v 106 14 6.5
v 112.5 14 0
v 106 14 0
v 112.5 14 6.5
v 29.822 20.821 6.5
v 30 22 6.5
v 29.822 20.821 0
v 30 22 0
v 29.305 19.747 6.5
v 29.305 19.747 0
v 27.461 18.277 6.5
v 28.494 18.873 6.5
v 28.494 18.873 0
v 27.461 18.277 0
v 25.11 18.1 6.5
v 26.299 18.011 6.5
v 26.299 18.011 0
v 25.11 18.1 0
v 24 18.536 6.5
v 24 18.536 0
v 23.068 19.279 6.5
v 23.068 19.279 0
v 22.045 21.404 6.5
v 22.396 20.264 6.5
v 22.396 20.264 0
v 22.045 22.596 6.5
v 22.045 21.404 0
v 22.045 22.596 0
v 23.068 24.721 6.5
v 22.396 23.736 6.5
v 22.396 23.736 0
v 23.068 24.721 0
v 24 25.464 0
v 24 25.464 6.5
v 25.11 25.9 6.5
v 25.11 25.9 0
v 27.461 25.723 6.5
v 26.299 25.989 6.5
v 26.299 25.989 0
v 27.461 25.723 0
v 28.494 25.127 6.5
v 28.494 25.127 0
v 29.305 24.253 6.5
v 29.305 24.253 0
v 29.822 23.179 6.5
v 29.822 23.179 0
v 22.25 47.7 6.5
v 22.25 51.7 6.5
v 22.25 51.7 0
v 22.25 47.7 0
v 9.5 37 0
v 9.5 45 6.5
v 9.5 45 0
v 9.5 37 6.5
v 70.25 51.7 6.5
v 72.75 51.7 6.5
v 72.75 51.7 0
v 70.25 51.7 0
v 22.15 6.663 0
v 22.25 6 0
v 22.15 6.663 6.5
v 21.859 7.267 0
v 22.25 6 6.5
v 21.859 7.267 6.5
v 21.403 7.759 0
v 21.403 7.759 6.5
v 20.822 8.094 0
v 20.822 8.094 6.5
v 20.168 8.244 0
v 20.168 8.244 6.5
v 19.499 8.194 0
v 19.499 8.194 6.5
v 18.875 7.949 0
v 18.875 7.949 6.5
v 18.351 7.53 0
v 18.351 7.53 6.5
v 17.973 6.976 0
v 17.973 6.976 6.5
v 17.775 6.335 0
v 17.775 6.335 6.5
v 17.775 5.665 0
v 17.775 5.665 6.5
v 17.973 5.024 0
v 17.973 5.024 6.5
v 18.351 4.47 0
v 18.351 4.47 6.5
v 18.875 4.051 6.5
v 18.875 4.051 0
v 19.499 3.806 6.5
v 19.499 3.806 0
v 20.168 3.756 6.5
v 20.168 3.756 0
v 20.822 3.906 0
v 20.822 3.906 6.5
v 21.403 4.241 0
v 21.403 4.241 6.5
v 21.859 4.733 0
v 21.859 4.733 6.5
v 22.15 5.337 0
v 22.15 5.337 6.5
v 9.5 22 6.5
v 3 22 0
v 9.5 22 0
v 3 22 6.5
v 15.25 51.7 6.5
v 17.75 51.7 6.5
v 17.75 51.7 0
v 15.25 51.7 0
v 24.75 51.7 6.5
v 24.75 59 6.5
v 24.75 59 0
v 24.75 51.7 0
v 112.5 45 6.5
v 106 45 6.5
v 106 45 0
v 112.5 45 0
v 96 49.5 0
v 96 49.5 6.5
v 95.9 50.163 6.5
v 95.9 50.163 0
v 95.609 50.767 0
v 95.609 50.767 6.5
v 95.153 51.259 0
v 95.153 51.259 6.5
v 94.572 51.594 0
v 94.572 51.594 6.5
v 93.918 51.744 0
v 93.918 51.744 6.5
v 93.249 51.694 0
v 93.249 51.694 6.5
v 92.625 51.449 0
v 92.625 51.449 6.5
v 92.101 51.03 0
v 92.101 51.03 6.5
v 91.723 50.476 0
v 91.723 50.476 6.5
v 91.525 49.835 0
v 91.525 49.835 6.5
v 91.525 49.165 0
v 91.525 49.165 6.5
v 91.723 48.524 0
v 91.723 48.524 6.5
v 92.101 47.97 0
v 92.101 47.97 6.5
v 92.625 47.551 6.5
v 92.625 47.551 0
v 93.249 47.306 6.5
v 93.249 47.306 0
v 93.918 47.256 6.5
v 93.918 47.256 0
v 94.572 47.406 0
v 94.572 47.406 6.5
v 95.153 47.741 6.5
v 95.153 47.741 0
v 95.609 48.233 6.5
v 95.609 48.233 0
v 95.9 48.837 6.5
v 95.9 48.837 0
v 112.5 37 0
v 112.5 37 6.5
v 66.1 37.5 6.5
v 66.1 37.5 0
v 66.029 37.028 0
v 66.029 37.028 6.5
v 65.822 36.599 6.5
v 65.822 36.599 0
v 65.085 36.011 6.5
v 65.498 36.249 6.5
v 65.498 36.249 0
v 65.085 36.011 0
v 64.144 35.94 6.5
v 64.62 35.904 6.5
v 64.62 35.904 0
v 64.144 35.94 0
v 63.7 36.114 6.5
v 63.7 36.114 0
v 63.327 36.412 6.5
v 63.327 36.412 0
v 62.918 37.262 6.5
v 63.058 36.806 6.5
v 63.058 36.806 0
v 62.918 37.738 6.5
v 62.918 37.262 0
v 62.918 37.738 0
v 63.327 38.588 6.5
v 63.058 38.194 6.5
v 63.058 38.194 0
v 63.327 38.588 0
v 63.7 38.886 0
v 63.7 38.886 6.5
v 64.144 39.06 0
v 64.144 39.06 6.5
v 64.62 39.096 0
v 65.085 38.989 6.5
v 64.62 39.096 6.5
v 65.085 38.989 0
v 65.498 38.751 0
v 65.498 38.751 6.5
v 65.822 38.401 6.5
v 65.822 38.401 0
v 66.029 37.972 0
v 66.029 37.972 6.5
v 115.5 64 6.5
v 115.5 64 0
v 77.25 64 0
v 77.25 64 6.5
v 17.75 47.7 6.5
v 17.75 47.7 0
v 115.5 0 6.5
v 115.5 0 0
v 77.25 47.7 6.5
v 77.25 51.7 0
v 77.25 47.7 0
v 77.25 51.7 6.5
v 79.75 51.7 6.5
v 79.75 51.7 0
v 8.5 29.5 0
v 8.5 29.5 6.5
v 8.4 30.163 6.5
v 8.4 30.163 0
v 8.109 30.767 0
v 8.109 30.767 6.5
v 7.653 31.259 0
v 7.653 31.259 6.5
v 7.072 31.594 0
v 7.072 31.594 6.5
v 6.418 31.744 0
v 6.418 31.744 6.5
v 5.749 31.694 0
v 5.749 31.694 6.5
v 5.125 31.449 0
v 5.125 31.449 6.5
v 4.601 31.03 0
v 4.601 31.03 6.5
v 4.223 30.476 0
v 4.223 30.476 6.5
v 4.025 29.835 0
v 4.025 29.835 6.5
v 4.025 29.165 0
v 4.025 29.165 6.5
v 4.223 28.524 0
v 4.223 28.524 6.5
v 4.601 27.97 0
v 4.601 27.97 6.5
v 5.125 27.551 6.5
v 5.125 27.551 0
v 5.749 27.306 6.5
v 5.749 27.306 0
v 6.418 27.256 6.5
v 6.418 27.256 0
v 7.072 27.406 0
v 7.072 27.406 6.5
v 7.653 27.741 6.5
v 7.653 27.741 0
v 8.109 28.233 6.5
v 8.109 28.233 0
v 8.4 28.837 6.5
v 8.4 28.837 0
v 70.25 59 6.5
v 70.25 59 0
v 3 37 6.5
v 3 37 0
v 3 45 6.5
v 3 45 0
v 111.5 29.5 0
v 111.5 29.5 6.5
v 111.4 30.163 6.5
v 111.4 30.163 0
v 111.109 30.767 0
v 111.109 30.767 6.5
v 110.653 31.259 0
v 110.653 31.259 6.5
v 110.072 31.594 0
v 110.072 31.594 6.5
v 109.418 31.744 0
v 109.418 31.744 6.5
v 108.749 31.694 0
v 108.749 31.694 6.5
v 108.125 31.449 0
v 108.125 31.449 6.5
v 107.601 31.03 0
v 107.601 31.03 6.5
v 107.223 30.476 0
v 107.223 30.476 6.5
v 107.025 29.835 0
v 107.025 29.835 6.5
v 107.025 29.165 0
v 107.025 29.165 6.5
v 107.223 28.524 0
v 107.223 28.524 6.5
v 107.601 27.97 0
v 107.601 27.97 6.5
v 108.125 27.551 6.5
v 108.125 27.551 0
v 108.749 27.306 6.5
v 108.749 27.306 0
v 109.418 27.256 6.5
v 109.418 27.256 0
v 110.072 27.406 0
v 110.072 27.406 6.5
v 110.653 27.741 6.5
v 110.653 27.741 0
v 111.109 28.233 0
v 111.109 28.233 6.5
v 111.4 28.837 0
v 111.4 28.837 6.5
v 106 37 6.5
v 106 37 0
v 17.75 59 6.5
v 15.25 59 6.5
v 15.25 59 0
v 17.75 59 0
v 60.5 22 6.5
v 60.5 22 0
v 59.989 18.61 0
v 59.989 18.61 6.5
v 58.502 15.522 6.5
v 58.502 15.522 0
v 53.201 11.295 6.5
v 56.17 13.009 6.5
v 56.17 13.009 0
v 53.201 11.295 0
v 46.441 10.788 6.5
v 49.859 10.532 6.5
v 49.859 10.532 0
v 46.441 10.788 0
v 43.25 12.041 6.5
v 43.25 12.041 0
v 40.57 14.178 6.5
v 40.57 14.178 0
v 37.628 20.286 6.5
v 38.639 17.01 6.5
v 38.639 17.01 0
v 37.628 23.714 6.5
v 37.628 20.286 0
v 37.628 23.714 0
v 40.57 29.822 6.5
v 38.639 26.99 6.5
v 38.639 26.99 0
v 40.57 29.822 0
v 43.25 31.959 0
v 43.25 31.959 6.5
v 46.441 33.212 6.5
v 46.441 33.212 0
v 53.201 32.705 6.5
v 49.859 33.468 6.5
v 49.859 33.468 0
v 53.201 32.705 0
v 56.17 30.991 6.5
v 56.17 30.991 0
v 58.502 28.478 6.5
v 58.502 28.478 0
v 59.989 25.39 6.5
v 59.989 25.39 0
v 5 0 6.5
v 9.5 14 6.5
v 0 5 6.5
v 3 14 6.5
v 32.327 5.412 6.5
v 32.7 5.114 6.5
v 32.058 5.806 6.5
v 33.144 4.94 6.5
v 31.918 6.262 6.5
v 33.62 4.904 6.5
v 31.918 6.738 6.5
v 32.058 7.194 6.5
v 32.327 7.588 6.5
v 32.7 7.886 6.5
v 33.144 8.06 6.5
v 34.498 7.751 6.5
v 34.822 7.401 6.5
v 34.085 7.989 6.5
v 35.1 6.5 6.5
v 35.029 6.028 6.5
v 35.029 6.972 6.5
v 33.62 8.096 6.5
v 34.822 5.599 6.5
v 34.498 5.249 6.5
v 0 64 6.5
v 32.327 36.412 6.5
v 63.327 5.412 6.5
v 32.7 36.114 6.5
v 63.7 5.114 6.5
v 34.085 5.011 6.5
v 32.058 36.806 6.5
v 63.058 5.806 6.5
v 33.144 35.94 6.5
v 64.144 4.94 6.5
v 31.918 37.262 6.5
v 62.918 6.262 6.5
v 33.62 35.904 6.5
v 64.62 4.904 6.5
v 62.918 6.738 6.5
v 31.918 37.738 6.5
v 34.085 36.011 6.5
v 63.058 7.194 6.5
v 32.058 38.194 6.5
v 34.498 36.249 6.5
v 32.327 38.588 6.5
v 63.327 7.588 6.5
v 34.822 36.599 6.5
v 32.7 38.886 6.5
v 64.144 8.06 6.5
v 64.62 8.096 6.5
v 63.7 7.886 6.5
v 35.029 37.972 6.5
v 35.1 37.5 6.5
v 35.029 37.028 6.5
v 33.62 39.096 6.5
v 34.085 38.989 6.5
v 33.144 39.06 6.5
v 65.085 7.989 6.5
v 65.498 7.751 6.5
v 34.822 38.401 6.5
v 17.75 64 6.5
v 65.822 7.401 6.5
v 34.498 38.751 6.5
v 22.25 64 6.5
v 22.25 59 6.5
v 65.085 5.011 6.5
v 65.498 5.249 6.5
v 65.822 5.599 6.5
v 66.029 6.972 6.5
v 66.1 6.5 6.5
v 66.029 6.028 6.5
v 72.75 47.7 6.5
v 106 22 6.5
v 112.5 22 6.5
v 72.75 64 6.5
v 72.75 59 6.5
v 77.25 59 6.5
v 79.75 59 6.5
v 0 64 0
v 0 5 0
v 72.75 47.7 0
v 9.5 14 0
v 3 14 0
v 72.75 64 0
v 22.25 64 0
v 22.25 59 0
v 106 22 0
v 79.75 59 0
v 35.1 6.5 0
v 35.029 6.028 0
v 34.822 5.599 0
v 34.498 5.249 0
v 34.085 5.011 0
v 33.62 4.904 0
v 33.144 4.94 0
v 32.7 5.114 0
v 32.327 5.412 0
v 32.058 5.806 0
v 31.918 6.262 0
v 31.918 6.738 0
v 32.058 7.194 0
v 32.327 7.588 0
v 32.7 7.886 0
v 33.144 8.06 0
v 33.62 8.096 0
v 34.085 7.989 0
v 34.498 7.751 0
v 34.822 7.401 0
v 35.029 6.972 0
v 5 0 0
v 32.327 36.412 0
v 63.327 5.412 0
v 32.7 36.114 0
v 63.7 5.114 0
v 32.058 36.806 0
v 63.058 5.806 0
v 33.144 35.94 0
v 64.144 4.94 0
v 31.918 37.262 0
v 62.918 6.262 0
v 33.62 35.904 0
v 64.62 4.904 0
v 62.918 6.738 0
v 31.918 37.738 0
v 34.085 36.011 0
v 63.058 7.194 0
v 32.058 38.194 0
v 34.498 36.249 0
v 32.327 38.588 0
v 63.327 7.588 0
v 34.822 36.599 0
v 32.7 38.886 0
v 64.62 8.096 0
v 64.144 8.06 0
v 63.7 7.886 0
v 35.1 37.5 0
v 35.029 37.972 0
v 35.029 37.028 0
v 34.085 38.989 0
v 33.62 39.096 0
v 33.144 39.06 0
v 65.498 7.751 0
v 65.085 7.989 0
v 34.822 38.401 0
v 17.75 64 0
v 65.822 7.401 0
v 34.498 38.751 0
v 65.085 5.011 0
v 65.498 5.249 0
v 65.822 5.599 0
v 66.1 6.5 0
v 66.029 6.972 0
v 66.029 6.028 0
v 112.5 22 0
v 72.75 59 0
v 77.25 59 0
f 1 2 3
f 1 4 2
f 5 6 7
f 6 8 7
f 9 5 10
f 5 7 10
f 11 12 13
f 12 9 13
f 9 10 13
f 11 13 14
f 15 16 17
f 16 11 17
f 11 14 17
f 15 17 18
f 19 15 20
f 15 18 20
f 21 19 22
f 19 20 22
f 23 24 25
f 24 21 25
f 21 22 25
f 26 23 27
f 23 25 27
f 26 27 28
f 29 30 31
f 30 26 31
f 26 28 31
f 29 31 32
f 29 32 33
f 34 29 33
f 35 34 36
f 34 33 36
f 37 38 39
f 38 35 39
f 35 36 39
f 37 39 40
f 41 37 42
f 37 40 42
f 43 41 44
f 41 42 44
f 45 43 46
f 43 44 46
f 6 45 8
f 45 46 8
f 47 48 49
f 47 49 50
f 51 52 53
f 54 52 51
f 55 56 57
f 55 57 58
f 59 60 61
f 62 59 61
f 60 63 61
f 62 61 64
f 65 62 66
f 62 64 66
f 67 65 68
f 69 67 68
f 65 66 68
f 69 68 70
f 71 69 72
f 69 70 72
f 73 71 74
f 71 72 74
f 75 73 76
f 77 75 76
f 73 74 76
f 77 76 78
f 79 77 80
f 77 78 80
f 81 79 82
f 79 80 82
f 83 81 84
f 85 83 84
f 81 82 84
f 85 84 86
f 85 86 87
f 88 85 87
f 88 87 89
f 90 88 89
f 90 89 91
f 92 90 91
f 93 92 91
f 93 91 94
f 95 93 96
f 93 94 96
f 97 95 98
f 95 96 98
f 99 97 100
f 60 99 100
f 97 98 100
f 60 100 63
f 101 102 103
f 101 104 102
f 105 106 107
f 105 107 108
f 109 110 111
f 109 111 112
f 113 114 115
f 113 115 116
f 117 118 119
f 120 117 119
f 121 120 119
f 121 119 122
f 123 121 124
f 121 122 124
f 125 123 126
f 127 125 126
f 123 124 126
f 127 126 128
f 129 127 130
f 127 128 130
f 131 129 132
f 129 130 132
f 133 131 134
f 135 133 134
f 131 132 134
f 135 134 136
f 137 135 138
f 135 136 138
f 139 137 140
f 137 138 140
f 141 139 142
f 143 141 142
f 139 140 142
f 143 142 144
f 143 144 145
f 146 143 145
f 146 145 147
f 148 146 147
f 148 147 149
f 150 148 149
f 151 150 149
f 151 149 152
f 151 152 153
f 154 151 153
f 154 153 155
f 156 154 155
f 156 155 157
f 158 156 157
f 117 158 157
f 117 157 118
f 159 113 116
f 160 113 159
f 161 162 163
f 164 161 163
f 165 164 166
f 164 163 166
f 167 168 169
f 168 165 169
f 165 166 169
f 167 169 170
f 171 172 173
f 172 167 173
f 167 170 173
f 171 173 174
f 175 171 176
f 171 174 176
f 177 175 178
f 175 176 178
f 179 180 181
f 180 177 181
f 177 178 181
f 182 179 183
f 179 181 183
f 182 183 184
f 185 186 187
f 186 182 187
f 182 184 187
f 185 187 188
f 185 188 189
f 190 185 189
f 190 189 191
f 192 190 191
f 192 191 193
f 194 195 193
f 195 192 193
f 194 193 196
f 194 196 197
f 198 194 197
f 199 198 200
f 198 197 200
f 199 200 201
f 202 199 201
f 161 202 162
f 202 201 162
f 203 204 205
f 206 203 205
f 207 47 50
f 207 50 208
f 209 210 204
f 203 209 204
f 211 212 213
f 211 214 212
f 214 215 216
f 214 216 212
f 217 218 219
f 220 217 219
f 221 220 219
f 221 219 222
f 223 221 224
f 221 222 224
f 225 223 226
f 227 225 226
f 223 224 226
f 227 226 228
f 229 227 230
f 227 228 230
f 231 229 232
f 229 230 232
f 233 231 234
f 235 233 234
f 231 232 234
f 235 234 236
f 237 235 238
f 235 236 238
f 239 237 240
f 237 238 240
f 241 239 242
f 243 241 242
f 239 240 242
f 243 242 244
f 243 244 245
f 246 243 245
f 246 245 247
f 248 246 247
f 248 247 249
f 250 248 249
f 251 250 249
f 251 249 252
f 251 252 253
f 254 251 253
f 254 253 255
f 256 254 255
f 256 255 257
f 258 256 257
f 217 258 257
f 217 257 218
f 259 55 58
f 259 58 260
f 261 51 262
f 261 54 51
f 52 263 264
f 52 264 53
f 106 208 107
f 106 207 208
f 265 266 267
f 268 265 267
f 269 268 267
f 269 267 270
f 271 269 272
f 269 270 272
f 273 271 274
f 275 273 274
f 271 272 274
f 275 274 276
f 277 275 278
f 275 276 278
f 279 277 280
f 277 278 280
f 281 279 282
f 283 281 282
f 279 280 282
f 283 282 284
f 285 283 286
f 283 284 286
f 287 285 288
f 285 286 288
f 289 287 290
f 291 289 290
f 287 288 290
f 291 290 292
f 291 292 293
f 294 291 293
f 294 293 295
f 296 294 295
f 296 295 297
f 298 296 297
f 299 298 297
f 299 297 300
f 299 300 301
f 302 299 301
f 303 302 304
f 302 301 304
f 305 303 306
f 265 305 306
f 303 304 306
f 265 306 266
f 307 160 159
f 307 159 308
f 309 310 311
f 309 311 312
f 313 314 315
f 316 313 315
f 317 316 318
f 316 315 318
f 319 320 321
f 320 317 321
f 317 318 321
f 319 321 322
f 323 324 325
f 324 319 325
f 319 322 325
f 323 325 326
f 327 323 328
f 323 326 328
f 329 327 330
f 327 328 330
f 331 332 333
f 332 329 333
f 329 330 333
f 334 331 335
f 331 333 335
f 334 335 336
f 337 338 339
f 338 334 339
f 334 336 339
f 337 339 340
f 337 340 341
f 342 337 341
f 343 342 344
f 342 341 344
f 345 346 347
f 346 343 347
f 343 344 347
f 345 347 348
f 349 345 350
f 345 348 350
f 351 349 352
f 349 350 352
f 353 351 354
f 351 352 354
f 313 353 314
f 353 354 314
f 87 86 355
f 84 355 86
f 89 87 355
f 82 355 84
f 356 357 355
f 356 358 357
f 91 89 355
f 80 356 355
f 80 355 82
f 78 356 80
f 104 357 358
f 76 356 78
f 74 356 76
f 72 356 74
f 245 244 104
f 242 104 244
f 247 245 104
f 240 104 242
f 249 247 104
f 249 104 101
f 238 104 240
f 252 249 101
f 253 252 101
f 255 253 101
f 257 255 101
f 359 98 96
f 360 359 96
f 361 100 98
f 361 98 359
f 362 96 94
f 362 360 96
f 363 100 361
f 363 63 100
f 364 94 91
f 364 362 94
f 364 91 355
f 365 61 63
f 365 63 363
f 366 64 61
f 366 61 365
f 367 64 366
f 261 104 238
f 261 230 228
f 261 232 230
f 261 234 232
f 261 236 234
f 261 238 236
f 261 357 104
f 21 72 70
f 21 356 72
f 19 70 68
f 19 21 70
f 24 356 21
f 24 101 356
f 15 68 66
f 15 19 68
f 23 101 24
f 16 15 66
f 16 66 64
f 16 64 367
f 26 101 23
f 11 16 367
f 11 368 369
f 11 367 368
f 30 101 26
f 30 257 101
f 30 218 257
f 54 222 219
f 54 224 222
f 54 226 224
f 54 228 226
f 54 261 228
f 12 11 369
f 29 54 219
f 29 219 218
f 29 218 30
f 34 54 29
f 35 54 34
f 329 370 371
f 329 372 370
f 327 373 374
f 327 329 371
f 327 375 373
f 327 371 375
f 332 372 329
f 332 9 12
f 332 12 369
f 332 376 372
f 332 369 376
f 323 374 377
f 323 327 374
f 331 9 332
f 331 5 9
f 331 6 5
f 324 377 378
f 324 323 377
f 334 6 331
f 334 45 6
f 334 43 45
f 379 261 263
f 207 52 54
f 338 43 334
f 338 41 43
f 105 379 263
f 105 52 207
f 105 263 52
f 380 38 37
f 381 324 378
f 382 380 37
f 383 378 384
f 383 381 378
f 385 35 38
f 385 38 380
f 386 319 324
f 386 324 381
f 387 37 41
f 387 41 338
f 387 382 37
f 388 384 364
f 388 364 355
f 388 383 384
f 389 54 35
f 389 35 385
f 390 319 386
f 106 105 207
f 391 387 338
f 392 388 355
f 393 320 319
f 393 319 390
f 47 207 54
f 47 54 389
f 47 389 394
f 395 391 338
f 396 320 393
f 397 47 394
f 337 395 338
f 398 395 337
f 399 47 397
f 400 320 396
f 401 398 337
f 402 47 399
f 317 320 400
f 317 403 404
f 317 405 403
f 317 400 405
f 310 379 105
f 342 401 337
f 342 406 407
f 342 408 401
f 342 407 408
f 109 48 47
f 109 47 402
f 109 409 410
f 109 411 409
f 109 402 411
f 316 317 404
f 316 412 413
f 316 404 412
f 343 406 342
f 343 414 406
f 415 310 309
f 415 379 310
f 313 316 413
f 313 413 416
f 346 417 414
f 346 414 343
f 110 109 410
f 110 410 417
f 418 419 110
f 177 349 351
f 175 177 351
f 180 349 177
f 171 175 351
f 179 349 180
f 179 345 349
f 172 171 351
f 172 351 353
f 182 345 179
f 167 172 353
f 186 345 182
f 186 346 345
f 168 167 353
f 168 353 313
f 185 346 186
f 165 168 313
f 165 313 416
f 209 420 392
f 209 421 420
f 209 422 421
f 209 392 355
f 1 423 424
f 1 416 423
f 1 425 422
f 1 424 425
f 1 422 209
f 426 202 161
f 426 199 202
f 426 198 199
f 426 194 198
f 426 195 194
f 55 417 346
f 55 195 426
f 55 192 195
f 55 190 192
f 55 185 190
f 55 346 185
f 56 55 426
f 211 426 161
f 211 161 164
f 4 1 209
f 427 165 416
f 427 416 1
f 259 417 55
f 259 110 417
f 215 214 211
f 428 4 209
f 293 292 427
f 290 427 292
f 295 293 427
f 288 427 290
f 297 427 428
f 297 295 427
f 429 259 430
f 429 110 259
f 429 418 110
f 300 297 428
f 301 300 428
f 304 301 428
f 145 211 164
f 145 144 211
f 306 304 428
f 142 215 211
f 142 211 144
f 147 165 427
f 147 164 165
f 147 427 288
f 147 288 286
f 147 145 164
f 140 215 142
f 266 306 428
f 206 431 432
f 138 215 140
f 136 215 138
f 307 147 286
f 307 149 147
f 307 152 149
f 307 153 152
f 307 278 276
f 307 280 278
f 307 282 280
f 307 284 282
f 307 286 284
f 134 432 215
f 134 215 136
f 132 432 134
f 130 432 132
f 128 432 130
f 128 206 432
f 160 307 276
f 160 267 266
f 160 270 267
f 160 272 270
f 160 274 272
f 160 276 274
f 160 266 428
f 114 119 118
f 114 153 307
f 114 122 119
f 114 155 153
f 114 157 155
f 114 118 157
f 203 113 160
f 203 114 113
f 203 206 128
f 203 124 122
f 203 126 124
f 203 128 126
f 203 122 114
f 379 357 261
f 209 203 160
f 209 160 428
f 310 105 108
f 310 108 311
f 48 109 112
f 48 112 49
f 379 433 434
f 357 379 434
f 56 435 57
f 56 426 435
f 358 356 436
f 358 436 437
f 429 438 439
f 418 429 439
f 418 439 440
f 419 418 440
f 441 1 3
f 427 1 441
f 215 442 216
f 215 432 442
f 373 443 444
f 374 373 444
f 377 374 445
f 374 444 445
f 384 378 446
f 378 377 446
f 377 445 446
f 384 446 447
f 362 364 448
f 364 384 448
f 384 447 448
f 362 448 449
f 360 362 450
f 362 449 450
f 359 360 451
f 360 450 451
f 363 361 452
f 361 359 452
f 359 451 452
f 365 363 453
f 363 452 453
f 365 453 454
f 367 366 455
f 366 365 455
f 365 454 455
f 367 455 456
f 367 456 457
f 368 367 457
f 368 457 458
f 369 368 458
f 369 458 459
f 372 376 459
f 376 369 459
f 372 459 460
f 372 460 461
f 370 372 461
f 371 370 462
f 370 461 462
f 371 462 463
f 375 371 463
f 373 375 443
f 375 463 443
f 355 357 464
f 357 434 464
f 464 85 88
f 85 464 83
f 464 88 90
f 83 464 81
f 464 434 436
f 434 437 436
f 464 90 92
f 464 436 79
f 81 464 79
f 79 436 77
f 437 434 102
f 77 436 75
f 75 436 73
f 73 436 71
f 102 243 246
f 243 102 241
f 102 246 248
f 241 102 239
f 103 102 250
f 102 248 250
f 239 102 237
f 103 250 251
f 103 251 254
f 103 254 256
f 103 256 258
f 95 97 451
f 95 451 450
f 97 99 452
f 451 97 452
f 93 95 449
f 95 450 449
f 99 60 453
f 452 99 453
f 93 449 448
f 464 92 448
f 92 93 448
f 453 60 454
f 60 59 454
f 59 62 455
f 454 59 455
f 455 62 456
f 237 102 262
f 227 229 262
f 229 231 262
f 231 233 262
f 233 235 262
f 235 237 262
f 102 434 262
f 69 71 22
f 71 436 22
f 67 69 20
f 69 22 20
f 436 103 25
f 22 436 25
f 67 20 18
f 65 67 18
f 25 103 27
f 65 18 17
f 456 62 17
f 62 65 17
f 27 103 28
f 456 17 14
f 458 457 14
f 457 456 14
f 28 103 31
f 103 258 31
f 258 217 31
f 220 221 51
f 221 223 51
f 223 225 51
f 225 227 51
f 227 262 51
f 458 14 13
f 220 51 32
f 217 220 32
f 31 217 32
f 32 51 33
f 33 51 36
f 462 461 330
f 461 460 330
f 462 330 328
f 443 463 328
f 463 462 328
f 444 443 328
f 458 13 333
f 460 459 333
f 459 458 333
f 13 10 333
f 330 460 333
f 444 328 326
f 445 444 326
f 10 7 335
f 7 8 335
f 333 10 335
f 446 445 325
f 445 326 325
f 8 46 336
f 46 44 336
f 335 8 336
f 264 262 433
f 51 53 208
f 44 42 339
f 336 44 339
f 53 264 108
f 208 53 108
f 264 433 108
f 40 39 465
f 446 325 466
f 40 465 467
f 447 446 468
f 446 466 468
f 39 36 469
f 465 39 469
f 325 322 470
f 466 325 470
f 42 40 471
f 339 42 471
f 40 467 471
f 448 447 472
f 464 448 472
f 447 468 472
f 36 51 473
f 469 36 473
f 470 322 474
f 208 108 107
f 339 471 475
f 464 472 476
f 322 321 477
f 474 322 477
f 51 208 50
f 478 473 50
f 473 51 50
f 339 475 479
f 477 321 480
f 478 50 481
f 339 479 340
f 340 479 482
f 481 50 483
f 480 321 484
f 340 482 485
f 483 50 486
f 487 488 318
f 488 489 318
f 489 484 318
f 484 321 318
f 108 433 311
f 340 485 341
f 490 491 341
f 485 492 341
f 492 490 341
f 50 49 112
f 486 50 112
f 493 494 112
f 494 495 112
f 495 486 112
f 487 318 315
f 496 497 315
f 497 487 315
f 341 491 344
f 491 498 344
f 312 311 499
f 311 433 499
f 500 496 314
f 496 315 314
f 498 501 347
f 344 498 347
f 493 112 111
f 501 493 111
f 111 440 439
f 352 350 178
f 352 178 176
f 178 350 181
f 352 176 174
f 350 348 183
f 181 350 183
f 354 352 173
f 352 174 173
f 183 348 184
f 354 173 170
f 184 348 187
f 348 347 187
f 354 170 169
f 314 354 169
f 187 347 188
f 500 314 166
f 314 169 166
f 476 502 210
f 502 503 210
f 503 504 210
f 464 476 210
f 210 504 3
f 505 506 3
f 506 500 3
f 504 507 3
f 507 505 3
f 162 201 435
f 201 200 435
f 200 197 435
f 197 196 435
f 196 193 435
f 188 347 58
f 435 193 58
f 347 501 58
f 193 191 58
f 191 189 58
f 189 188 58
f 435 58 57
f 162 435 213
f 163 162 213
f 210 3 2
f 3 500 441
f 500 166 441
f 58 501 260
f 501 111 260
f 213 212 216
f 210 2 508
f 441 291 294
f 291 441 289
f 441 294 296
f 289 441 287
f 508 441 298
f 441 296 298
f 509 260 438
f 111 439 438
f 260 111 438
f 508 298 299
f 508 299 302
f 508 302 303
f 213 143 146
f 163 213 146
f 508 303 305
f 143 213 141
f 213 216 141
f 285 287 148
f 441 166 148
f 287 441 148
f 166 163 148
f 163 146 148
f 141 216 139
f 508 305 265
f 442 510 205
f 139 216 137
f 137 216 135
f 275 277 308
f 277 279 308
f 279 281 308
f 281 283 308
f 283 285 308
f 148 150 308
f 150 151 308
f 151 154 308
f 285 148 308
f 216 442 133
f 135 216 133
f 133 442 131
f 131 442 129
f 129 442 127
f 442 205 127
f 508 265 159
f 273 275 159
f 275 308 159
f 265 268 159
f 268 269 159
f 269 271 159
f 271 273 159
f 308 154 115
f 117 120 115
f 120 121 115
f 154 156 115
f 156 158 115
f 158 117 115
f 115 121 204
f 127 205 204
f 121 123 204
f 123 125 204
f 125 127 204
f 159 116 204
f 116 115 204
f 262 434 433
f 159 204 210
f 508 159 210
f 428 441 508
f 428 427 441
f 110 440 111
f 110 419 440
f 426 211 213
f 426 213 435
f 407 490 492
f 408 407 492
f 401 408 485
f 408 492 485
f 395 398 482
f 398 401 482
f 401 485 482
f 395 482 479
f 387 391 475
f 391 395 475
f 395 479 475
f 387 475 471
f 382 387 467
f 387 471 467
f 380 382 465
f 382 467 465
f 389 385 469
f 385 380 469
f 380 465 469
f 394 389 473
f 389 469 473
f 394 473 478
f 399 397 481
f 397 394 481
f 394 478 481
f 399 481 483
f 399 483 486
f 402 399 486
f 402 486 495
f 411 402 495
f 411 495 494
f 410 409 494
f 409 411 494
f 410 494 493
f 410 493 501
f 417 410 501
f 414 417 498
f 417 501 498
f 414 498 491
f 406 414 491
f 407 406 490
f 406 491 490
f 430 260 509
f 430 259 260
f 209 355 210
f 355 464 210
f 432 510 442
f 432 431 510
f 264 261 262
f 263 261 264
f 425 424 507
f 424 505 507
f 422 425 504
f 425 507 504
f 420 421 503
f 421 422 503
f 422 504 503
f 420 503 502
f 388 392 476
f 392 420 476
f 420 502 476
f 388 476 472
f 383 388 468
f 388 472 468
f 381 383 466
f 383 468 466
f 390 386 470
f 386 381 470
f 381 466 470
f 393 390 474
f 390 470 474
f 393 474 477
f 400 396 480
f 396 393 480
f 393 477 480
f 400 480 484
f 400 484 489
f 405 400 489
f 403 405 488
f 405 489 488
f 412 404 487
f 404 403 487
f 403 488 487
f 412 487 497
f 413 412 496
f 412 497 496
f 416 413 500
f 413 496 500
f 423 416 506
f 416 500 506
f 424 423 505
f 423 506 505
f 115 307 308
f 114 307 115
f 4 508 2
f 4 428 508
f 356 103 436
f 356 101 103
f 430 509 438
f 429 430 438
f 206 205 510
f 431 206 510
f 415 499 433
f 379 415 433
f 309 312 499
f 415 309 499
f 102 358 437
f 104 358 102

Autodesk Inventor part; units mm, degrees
ref_plane "YZ Plane" through (0, 0, 0) normal (1, 0, 0) x (0, 1, 0)
ref_plane "XZ Plane" through (0, 0, 0) normal (0, 1, 0) x (-1, 0, 0)
ref_plane "XY Plane" through (0, 0, 0) normal (0, 0, 1) x (1, 0, 0)
sketch "Sketch1" plane through (0, 0, 0) normal (0, 0, 1) x (1, 0, 0)
  line L0 (5, 0) -> (115.5, 0)
  line L1 (115.5, 0) -> (115.5, 64)
  line L2 (115.5, 64) -> (0, 64)
  line L3 (0, 64) -> (0, 5)
  line L4 (0, 5) -> (5, 0)
  line L5 (33.5, 37.5) -> (64.5, 37.5) construction
  line L6 (64.5, 37.5) -> (64.5, 6.5) construction
  line L7 (64.5, 6.5) -> (33.5, 6.5) construction
  line L8 (33.5, 6.5) -> (33.5, 37.5) construction
  line L9 (27.62, 43.38) -> (70.38, 43.38) construction
  line L10 (70.38, 43.38) -> (70.38, 0.62) construction
  line L11 (70.38, 0.62) -> (27.62, 0.62) construction
  line L12 (27.62, 0.62) -> (27.62, 43.38) construction
  circle A0 centre (33.5, 6.5) radius 1.6
  circle A1 centre (64.5, 6.5) radius 1.6
  circle A2 centre (64.5, 37.5) radius 1.6
  circle A3 centre (33.5, 37.5) radius 1.6
  circle A4 centre (49, 22) radius 11.5
  circle A5 centre (26, 22) radius 4
  point P0 (0, 0)
  point P1 (49, 37.5)
  point P2 (64.5, 22)
  point P3 (70.38, 22)
  point P4 (49, 43.38)
  dimension "d0" = 45
  dimension "d1" = 31
  dimension "d2" = 42.76
  dimension "d3" = 3.2
  dimension "d4" = 23
  dimension "d5" = 8
  dimension "d6" = 23
  dimension "d8" = 115.5
  dimension "d9" = 42
  dimension "d10" = 5
  dimension "d11" = 22
  dimension "d63" = 26
extrude "Extrusion1" add sketch "Sketch1" along normal blind 6.5
sketch "Sketch3" plane through (0, 0, 6.5) normal (0, 0, 1) x (1, 0, 0)
  circle A0 centre (26, 22) radius 4 projected
  circle A1 centre (64.5, 37.5) radius 1.6 projected
  line L0 (5, 0) -> (115.5, 0) projected
  circle A2 centre (20, 6) radius 2.25
  circle A3 centre (93.75, 49.5) radius 2.25
  line L1 (115.5, 0) -> (115.5, 64) projected
  point P0 (0, 0)
  dimension "d29" = 4.5
  dimension "d30" = 6
  dimension "d31" = 6
  dimension "d32" = 12
  dimension "d64" = 21.75
extrude "Extrusion3" cut sketch "Sketch3" against normal through all contours A2 | A3
sketch "Sketch4" plane through (0, 0, 6.5) normal (0, 0, 1) x (1, 0, 0)
  line L0 (115.5, 0) -> (115.5, 64) projected
  line L1 (0, 64) -> (0, 5) projected
  line L2 (5, 0) -> (115.5, 0) projected
  line L3 (3, 22) -> (9.5, 22)
  line L4 (9.5, 22) -> (9.5, 14)
  line L5 (9.5, 14) -> (3, 14)
  line L6 (3, 14) -> (3, 22)
  line L7 (3, 45) -> (9.5, 45)
  line L8 (9.5, 45) -> (9.5, 37)
  line L9 (9.5, 37) -> (3, 37)
  line L10 (3, 37) -> (3, 45)
  line L11 (106, 45) -> (112.5, 45)
  line L12 (112.5, 45) -> (112.5, 37)
  line L13 (112.5, 37) -> (106, 37)
  line L14 (106, 37) -> (106, 45)
  line L15 (106, 22) -> (112.5, 22)
  line L16 (112.5, 22) -> (112.5, 14)
  line L17 (112.5, 14) -> (106, 14)
  line L18 (106, 14) -> (106, 22)
  line L19 (3, 37) -> (9.5, 22) construction
  line L20 (3, 22) -> (9.5, 37) construction
  line L21 (106, 37) -> (112.5, 22) construction
  line L22 (106, 22) -> (112.5, 37) construction
  circle A0 centre (6.25, 29.5) radius 2.25
  circle A1 centre (109.25, 29.5) radius 2.25
  point P0 (0, 0)
  dimension "d36" = 6.5
  dimension "d37" = 8
  dimension "d38" = 8
  dimension "d39" = 6.5
  dimension "d40" = 15
  dimension "d41" = 3
  dimension "d42" = 3
  dimension "d43" = 14
  dimension "d44" = 4.5
extrude "Extrusion4" cut sketch "Sketch4" against normal through all
sketch "Sketch5" plane through (0, 0, 6.5) normal (0, 0, 1) x (1, 0, 0)
  line L0 (115.5, 64) -> (0, 64) projected
  line L1 (0, 64) -> (0, 5) projected
  line L2 (17.75, 64) -> (22.25, 64)
  line L3 (22.25, 47.7) -> (17.75, 47.7)
  line L4 (24.75, 59) -> (24.75, 51.7)
  line L5 (15.25, 51.7) -> (15.25, 59)
  line L6 (17.75, 47.7) -> (17.75, 51.7)
  line L7 (17.75, 59) -> (17.75, 64)
  line L8 (22.25, 64) -> (22.25, 59)
  line L9 (22.25, 51.7) -> (22.25, 47.7)
  line L10 (15.25, 59) -> (17.75, 59)
  line L11 (22.25, 59) -> (24.75, 59)
  line L12 (24.75, 51.7) -> (22.25, 51.7)
  line L13 (17.75, 51.7) -> (15.25, 51.7)
  line L14 (72.75, 64) -> (77.25, 64)
  line L15 (77.25, 47.7) -> (72.75, 47.7)
  line L16 (79.75, 59) -> (79.75, 51.7)
  line L17 (70.25, 51.7) -> (70.25, 59)
  line L18 (72.75, 47.7) -> (72.75, 51.7)
  line L19 (72.75, 59) -> (72.75, 64)
  line L20 (77.25, 64) -> (77.25, 59)
  line L21 (77.25, 51.7) -> (77.25, 47.7)
  line L22 (70.25, 59) -> (72.75, 59)
  line L23 (77.25, 59) -> (79.75, 59)
  line L24 (79.75, 51.7) -> (77.25, 51.7)
  line L25 (72.75, 51.7) -> (70.25, 51.7)
  point P0 (0, 0)
  point P1 (20, 47.7)
  point P2 (75, 47.7)
  dimension "d47" = 4.5
  dimension "d48" = 2.5
  dimension "d49" = 2.5
  dimension "d50" = 5
  dimension "d51" = 7.3
  dimension "d52" = 4
  dimension "d53" = 4.5
  dimension "d54" = 2.5
  dimension "d55" = 2.5
  dimension "d56" = 5
  dimension "d57" = 7.3
  dimension "d58" = 4
  dimension "d59" = 20
  dimension "d60" = 55
extrude "Extrusion5" cut sketch "Sketch5" against normal through all
equation "\"d39\" = d36"
properties part number "z_motor_mount"
